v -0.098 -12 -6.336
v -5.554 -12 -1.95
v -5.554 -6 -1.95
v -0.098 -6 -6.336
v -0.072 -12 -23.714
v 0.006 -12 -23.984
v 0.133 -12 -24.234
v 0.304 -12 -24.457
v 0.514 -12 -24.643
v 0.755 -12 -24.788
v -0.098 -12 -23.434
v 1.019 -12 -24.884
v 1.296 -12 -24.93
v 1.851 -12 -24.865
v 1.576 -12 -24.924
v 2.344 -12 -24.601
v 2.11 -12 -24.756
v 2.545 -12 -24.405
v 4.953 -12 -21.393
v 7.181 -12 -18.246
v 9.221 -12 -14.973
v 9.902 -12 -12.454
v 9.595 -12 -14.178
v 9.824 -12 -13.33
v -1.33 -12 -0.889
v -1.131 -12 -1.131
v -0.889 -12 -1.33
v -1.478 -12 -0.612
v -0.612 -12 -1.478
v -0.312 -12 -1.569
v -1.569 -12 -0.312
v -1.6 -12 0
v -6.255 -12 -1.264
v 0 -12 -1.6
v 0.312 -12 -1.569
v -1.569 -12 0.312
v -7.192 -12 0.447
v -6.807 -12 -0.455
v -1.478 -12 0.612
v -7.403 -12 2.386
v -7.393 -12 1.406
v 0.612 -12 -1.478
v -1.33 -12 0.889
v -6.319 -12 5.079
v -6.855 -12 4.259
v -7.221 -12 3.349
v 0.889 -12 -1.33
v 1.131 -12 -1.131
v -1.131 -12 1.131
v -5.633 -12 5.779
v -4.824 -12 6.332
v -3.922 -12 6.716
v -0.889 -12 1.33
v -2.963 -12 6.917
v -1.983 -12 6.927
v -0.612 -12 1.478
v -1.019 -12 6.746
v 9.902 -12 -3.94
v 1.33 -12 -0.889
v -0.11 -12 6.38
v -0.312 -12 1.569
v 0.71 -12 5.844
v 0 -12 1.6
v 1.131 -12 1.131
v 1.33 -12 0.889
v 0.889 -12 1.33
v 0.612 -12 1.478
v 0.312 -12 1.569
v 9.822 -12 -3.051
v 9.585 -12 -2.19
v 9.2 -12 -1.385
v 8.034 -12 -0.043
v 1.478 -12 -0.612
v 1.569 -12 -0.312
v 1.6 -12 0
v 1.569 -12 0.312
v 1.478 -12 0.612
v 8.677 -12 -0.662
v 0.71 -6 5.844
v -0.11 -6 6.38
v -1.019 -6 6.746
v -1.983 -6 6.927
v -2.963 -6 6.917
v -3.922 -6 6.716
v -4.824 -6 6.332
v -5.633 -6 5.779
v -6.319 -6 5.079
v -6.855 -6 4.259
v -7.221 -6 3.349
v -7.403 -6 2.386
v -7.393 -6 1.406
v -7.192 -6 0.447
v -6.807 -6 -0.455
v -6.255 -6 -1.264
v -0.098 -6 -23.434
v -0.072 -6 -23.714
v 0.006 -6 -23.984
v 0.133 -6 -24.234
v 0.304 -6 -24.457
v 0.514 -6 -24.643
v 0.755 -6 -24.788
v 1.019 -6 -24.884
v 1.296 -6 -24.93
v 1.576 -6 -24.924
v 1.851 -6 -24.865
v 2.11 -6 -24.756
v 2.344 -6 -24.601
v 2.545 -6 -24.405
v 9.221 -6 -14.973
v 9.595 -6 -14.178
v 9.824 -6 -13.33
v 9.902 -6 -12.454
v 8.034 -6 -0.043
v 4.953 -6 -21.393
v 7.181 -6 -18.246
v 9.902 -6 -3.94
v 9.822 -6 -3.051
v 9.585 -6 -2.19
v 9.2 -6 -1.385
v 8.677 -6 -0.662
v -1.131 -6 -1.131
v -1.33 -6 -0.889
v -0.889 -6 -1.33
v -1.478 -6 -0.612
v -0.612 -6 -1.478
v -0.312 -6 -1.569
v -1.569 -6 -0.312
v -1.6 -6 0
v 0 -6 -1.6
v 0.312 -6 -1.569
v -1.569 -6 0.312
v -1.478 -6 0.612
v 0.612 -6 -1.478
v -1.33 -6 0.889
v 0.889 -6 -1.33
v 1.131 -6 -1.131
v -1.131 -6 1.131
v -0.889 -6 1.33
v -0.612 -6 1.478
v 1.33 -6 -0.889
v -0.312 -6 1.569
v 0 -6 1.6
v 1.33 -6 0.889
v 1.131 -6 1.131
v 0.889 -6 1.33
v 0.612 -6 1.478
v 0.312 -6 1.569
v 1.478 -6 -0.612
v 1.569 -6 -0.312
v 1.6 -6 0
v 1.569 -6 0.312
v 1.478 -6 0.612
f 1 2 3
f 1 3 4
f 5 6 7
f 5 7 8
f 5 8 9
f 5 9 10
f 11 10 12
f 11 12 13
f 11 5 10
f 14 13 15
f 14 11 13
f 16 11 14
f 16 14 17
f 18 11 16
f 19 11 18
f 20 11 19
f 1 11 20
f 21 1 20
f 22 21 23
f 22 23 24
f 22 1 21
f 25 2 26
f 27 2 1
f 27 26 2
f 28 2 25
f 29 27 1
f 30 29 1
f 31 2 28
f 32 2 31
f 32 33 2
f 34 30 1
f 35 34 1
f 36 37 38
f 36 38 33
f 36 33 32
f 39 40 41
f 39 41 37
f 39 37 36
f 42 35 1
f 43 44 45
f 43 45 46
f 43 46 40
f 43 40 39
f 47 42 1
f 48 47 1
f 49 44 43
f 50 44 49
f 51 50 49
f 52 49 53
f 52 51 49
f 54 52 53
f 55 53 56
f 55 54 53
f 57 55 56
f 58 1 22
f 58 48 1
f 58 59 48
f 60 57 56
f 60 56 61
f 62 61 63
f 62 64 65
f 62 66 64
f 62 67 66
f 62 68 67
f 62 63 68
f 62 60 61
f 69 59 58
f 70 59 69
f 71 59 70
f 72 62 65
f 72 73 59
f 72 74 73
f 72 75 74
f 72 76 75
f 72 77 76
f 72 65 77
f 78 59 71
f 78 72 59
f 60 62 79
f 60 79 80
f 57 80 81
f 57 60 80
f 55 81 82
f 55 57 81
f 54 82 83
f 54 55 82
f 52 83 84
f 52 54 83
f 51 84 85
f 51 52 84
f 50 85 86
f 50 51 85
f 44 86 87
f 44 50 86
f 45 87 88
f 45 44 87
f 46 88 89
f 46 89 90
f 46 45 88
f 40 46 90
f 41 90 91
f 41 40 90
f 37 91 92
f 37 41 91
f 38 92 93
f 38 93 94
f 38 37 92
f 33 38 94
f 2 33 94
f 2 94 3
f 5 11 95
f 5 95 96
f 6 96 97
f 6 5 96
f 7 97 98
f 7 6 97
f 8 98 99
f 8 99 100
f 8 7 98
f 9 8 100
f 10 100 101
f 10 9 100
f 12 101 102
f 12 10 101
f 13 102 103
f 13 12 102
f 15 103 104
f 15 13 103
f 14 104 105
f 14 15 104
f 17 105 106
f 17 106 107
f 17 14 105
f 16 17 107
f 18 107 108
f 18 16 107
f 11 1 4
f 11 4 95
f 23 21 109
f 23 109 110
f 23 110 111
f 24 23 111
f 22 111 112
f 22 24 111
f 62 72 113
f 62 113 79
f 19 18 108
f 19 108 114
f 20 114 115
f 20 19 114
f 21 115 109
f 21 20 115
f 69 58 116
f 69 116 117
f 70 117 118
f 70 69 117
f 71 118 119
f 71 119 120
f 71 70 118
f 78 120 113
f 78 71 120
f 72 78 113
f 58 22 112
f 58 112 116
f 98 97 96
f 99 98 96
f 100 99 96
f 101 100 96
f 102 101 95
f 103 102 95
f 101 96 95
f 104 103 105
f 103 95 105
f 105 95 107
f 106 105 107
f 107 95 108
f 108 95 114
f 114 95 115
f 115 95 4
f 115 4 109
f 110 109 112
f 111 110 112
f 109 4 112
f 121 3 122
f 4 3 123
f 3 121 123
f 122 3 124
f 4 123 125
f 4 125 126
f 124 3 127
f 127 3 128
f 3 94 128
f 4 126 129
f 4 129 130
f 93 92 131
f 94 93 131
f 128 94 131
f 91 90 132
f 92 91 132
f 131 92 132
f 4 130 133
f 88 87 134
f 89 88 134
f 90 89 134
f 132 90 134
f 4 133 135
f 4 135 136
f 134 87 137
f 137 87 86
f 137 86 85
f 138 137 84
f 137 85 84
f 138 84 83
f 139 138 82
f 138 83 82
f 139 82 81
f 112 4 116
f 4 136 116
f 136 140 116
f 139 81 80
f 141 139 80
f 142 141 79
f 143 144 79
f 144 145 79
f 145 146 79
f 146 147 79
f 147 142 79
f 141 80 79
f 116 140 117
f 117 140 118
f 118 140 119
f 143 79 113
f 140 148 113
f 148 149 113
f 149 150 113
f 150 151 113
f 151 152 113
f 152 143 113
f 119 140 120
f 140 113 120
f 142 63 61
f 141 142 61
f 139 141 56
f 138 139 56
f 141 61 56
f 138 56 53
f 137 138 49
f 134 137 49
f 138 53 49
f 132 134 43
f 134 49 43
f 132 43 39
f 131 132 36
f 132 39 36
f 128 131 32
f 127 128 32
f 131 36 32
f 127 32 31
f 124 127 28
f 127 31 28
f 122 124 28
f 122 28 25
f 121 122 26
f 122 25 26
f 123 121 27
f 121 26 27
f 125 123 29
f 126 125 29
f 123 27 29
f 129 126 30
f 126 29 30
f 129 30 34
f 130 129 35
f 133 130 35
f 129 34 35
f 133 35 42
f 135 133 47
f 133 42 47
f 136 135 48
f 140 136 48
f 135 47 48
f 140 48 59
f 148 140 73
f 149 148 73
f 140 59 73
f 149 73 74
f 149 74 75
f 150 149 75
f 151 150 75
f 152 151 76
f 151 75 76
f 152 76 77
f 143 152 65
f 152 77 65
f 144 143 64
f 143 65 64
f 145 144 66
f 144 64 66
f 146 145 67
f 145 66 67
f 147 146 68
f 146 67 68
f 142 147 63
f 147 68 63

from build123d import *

# Parameters (mm, degrees)
ESBO_O1_R                = 1.6
RESSALTO_EXTRUS_O1_DEPTH = 6


with BuildPart() as part:
    # Esboço1 → Ressalto-extrusão1 (new body)
    with BuildSketch(Plane.XZ.offset(12)):
        with BuildLine():
            Line((-5.554408486, -1.950425304), (-0.098401843, -6.33585476))
            Line((-0.098401843, -6.33585476), (-0.098401843, -23.434191187))
            ThreePointArc((-0.098401843, -23.434191187), (0.884517689, -24.84224935), (2.545101876, -24.404963685))
            ThreePointArc((2.545101876, -24.404963685), (6.090429059, -19.835978921), (9.220727662, -14.973243345))
            ThreePointArc((9.220727662, -14.973243345), (9.728380083, -13.758965882), (9.901598157, -12.454291119))
            Line((9.901598157, -12.454291119), (9.901598157, -3.939806958))
            ThreePointArc((9.901598157, -3.939806958), (9.410602928, -1.779048764), (8.034047768, -0.042659356))
            Line((8.034047768, -0.042659356), (0.710490736, 5.843869901))
            ThreePointArc((0.710490736, 5.843869901), (-6.319106477, 5.07917191), (-5.554408486, -1.950425304))
        make_face()
        with Locations(Location((0, 0, 0), (0, 0, 90))):
            Circle(ESBO_O1_R, mode=Mode.SUBTRACT)
    extrude(amount=-RESSALTO_EXTRUS_O1_DEPTH)


solid = part.part
